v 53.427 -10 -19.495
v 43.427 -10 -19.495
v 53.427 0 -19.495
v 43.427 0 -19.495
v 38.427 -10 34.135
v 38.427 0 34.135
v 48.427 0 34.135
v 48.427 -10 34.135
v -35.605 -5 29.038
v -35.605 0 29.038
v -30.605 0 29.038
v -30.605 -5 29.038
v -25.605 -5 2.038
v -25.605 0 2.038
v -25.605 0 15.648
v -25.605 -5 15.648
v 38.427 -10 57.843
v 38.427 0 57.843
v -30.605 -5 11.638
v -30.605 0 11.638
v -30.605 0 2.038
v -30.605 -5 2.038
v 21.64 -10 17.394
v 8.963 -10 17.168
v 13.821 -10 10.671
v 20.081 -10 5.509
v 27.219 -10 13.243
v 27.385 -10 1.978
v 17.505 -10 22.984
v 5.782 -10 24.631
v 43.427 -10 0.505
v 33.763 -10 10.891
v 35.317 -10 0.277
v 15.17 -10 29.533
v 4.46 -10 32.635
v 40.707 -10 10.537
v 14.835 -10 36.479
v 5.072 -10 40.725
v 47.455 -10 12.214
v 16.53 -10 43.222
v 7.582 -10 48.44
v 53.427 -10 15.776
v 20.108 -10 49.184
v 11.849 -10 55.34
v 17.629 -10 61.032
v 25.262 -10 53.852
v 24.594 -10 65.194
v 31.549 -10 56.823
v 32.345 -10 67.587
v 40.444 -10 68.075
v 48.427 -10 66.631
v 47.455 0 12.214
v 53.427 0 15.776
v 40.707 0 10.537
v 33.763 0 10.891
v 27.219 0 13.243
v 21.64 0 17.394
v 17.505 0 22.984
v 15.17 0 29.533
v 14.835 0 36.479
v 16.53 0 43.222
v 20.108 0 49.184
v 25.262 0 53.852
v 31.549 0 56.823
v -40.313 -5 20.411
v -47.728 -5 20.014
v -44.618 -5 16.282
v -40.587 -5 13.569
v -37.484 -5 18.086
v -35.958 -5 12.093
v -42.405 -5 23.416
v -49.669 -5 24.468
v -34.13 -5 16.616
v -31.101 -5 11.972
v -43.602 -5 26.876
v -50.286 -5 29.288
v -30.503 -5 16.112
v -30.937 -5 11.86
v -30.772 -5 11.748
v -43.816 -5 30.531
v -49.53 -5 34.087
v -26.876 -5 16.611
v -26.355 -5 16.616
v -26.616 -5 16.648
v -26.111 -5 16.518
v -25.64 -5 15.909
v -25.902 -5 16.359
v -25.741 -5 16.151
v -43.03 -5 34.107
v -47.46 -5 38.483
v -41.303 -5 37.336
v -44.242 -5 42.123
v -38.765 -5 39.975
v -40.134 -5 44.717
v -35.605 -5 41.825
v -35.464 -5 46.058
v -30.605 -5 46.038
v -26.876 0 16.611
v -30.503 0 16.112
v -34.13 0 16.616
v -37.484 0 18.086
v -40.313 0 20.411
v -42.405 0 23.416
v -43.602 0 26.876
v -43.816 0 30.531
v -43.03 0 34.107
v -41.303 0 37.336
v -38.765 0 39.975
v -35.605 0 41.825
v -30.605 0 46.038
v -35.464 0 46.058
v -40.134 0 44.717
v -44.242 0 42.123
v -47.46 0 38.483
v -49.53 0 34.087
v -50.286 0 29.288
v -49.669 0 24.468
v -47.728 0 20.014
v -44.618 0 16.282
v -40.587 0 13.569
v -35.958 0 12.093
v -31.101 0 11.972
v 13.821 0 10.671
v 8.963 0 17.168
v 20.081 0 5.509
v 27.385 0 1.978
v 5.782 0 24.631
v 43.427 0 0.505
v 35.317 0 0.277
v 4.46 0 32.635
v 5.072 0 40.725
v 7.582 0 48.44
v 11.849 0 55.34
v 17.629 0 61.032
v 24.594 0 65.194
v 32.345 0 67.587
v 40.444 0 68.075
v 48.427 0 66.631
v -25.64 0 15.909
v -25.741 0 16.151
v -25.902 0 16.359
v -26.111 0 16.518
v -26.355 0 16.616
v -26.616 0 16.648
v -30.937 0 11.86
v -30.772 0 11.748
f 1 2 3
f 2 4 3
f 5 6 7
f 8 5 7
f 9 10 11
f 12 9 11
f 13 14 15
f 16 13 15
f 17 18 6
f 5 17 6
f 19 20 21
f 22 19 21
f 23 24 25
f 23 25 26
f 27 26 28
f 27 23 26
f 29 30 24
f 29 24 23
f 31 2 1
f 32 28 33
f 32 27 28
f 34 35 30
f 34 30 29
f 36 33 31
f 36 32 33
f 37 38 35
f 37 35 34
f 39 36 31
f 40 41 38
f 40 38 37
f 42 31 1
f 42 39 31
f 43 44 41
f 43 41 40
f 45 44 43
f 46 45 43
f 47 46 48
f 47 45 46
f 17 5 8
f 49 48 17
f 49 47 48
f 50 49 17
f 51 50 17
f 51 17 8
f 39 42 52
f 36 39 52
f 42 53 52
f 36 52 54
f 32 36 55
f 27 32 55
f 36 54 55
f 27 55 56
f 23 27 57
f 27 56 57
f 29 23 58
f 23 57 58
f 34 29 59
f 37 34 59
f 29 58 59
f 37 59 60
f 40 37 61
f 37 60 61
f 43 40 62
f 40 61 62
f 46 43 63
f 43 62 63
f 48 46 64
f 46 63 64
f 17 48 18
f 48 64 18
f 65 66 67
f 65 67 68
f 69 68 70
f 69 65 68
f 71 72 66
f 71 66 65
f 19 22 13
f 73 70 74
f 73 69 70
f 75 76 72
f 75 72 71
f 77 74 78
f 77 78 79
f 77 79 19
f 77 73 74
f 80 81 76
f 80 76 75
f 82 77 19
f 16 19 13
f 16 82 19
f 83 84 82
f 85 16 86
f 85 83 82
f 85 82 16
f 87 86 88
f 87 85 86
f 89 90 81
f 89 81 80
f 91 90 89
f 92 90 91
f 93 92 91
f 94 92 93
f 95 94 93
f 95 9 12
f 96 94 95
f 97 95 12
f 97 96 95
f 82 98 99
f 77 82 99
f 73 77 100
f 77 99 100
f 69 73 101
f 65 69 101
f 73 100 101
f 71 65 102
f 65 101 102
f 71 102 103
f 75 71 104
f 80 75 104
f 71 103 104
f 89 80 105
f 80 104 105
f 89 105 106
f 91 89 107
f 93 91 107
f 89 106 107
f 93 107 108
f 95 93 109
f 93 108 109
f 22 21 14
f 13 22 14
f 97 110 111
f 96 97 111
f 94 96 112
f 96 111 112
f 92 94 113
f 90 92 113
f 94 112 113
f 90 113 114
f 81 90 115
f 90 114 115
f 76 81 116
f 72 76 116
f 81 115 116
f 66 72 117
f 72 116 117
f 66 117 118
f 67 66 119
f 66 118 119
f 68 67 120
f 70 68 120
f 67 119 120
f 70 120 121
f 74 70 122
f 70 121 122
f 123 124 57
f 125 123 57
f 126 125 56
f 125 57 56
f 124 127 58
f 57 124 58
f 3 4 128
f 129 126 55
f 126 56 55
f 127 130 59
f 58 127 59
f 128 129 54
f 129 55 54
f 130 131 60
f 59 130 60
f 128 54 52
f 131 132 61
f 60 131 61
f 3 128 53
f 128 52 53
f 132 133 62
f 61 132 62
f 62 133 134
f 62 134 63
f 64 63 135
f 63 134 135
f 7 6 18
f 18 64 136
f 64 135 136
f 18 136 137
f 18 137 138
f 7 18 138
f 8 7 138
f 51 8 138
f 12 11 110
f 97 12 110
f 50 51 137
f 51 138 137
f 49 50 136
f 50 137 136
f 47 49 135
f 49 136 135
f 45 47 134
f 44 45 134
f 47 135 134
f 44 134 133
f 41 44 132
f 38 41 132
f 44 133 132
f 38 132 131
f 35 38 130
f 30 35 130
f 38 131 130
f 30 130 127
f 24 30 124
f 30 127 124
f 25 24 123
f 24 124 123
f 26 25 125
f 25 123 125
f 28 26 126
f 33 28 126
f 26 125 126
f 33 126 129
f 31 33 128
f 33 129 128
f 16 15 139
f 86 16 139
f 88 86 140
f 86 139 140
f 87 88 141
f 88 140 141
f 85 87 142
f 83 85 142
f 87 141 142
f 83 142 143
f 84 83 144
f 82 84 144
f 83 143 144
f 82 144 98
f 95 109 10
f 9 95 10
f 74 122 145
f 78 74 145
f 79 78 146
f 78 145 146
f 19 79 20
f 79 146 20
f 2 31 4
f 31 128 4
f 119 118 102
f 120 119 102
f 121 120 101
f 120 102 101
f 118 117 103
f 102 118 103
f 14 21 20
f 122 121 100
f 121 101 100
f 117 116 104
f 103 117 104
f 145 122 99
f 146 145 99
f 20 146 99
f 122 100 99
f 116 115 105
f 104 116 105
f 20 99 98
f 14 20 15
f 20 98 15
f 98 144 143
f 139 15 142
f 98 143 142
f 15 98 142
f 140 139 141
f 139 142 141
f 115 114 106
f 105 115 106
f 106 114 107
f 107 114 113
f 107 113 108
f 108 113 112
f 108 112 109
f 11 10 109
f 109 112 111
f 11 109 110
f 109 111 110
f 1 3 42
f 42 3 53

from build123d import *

# Parameters (mm, degrees)
F1_DEPTH = 5
F2_DEPTH = 5


with BuildPart() as f1:
    # F0 (on Front) → F1 (new body)
    with BuildSketch(Plane.XZ):
        with BuildLine():
            Line((-30.6054087508, 29.0378890929), (-30.6054087508, 46.0378890929))
            ThreePointArc((-30.6054087508, 46.0378890929), (-50.2864340073, 29.2876312352), (-31.1005821345, 11.9724072586))
            ThreePointArc((-31.1005821345, 11.9724072586), (-30.8527574954, 12.0033488197), (-30.6054087508, 12.0378890929))
            Line((-30.6054087508, 12.0378890929), (-30.6054087508, 11.6384769364))
            Line((-30.6054087508, 11.6384769364), (-30.6054087508, 2.0378890929))
            Line((-30.6054087508, 2.0378890929), (-25.6054087508, 2.0378890929))
            Line((-25.6054087508, 2.0378890929), (-25.6054087508, 15.6481668049))
            ThreePointArc((-25.6054087508, 15.6481668049), (-26.0015197853, 16.4452352569), (-26.8760449853, 16.6108484909))
            ThreePointArc((-26.8760449853, 16.6108484909), (-43.122496261, 25.1046217578), (-35.6054087508, 41.8254099786))
            Line((-35.6054087508, 41.8254099786), (-35.6054087508, 31.0378890929))
            Line((-35.6054087508, 31.0378890929), (-35.6054087508, 29.0378890929))
            Line((-35.6054087508, 29.0378890929), (-30.6054087508, 29.0378890929))
        make_face()
        with BuildLine():
            ThreePointArc((-30.6054087508, 12.0378890929), (-30.8527574954, 12.0033488197), (-31.1005821345, 11.9724072586))
            ThreePointArc((-31.1005821345, 11.9724072586), (-30.8541948144, 11.8036635919), (-30.6054087508, 11.6384769364))
            Line((-30.6054087508, 11.6384769364), (-30.6054087508, 12.0378890929))
        make_face()
    extrude(amount=F1_DEPTH)


with BuildPart() as f1b:
    # F0 (on Front) → F1, piece 2 (new body)
    with BuildSketch(Plane.XZ):
        with BuildLine():
            Line((48.4268052876, 34.1349840164), (48.4268052876, 66.631137635))
            ThreePointArc((48.4268052876, 66.631137635), (4.5235841521, 36.6984965751), (43.4268052876, 0.5046405748))
            Line((43.4268052876, 0.5046405748), (43.4268052876, 0))
            Line((43.4268052876, 0), (43.4268052876, -19.4953594252))
            Line((43.4268052876, -19.4953594252), (53.4268052876, -19.4953594252))
            Line((53.4268052876, -19.4953594252), (53.4268052876, 10.5046405748))
            Line((53.4268052876, 10.5046405748), (53.4268052876, 15.7757917067))
            ThreePointArc((53.4268052876, 15.7757917067), (16.0961529885, 26.1724523737), (38.4268052876, 57.8427874209))
            Line((38.4268052876, 57.8427874209), (38.4268052876, 34.1349840164))
            Line((38.4268052876, 34.1349840164), (48.4268052876, 34.1349840164))
        make_face()
    extrude(amount=F1_DEPTH)

    # F2 (add): a face of the model
    f2_faces = [f1b.faces().sort_by_distance(p)[0] for p in [
        (47.4228094165, -5, 50.3830608257),
    ]]
    extrude(f2_faces, amount=F2_DEPTH)


solid = Compound([f1.part, f1b.part])
